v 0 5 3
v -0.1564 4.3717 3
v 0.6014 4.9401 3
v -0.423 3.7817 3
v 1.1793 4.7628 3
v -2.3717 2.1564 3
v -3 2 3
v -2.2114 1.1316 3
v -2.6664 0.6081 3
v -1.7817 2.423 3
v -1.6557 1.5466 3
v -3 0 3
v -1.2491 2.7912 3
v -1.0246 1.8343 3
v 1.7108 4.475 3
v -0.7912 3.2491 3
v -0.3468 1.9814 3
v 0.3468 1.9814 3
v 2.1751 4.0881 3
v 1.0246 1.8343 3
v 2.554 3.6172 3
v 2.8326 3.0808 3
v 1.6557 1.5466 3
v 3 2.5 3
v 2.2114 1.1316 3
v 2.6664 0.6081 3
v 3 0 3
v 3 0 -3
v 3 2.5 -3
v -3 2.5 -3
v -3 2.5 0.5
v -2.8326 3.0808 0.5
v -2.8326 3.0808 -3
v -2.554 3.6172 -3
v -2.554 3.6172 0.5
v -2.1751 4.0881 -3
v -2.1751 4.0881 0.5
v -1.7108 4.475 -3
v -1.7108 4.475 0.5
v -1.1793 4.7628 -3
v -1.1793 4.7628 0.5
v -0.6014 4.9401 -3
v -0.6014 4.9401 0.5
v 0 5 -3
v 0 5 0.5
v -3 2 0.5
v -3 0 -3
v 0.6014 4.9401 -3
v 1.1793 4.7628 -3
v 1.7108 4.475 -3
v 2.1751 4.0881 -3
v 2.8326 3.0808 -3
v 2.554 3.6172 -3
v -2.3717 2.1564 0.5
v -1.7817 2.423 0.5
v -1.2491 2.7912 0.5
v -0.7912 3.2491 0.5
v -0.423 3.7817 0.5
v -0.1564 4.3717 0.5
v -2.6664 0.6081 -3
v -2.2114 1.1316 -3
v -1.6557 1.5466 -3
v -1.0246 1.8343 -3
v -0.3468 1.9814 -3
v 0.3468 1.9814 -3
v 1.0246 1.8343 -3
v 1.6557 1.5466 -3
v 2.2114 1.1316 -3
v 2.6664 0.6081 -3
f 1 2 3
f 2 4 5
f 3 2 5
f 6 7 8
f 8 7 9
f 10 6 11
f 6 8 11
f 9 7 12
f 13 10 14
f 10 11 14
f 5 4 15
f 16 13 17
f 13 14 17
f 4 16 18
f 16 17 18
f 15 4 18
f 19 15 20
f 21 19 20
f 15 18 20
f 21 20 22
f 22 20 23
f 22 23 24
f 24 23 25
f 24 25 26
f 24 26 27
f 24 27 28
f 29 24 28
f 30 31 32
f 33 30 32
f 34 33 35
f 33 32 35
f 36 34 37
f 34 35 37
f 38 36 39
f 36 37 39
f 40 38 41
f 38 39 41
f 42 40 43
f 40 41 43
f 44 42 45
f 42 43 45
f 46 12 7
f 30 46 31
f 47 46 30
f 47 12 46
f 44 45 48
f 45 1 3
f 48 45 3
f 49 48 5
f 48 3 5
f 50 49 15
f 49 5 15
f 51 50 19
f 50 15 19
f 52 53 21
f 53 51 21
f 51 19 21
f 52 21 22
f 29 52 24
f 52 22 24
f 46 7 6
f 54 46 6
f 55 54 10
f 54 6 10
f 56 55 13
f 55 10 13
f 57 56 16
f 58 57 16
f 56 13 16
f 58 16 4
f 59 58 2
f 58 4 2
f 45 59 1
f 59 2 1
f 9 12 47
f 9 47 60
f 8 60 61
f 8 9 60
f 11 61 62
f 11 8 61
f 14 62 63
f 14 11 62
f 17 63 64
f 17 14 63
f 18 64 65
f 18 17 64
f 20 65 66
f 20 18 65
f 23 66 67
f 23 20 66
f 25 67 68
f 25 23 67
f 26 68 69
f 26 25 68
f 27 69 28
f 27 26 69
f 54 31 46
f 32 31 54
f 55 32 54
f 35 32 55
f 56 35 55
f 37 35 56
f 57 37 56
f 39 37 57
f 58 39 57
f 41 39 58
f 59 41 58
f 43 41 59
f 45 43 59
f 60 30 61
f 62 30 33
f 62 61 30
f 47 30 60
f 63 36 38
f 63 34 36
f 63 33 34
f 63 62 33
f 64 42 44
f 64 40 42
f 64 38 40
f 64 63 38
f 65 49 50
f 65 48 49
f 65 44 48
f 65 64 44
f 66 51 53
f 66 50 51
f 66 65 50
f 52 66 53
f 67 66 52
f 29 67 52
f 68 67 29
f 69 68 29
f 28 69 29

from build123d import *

# Parameters (mm, degrees)
SKETCH1_W           = 6
SKETCH1_H           = 6
BOSS_EXTRUDE1_DEPTH = 5
CUT_EXTRUDE4_DEPTH  = 12.5
CUT_EXTRUDE5_DEPTH  = 2.5


with BuildPart() as part:
    # Sketch1 → Boss-Extrude1 (new body)
    with BuildSketch(Plane(origin=(0, 0, 0), x_dir=(1, 0, 0), z_dir=(0, 1, 0))):
        Rectangle(SKETCH1_W, SKETCH1_H)
    extrude(amount=BOSS_EXTRUDE1_DEPTH)

    # Sketch5 → Cut-Extrude4 (cut)
    with BuildSketch(Plane.XY.offset(3)):
        with BuildLine():
            Line((-3, 5), (-3, 2.5))
            ThreePointArc((-3, 2.5), (-1.952562419, 4.293074903), (0, 5))
            Line((0, 5), (-3, 5))
        make_face()
        with BuildLine():
            ThreePointArc((0, 5), (1.952562419, 4.293074903), (3, 2.5))
            Line((3, 2.5), (3, 5))
            Line((3, 5), (0, 5))
        make_face()
        with BuildLine():
            ThreePointArc((-3, 0), (0, 2), (3, 0))
            Line((3, 0), (-3, 0))
        make_face()
    extrude(amount=-CUT_EXTRUDE4_DEPTH, mode=Mode.SUBTRACT)

    # Sketch6 → Cut-Extrude5 (cut)
    with BuildSketch(Plane.XY.offset(3)):
        with BuildLine():
            ThreePointArc((-3, 2), (-1.009831788, 3.009831788), (0, 5))
            ThreePointArc((0, 5), (-1.952562419, 4.293074903), (-3, 2.5))
            Line((-3, 2.5), (-3, 2))
        make_face()
    extrude(amount=-CUT_EXTRUDE5_DEPTH, mode=Mode.SUBTRACT)


solid = part.part
